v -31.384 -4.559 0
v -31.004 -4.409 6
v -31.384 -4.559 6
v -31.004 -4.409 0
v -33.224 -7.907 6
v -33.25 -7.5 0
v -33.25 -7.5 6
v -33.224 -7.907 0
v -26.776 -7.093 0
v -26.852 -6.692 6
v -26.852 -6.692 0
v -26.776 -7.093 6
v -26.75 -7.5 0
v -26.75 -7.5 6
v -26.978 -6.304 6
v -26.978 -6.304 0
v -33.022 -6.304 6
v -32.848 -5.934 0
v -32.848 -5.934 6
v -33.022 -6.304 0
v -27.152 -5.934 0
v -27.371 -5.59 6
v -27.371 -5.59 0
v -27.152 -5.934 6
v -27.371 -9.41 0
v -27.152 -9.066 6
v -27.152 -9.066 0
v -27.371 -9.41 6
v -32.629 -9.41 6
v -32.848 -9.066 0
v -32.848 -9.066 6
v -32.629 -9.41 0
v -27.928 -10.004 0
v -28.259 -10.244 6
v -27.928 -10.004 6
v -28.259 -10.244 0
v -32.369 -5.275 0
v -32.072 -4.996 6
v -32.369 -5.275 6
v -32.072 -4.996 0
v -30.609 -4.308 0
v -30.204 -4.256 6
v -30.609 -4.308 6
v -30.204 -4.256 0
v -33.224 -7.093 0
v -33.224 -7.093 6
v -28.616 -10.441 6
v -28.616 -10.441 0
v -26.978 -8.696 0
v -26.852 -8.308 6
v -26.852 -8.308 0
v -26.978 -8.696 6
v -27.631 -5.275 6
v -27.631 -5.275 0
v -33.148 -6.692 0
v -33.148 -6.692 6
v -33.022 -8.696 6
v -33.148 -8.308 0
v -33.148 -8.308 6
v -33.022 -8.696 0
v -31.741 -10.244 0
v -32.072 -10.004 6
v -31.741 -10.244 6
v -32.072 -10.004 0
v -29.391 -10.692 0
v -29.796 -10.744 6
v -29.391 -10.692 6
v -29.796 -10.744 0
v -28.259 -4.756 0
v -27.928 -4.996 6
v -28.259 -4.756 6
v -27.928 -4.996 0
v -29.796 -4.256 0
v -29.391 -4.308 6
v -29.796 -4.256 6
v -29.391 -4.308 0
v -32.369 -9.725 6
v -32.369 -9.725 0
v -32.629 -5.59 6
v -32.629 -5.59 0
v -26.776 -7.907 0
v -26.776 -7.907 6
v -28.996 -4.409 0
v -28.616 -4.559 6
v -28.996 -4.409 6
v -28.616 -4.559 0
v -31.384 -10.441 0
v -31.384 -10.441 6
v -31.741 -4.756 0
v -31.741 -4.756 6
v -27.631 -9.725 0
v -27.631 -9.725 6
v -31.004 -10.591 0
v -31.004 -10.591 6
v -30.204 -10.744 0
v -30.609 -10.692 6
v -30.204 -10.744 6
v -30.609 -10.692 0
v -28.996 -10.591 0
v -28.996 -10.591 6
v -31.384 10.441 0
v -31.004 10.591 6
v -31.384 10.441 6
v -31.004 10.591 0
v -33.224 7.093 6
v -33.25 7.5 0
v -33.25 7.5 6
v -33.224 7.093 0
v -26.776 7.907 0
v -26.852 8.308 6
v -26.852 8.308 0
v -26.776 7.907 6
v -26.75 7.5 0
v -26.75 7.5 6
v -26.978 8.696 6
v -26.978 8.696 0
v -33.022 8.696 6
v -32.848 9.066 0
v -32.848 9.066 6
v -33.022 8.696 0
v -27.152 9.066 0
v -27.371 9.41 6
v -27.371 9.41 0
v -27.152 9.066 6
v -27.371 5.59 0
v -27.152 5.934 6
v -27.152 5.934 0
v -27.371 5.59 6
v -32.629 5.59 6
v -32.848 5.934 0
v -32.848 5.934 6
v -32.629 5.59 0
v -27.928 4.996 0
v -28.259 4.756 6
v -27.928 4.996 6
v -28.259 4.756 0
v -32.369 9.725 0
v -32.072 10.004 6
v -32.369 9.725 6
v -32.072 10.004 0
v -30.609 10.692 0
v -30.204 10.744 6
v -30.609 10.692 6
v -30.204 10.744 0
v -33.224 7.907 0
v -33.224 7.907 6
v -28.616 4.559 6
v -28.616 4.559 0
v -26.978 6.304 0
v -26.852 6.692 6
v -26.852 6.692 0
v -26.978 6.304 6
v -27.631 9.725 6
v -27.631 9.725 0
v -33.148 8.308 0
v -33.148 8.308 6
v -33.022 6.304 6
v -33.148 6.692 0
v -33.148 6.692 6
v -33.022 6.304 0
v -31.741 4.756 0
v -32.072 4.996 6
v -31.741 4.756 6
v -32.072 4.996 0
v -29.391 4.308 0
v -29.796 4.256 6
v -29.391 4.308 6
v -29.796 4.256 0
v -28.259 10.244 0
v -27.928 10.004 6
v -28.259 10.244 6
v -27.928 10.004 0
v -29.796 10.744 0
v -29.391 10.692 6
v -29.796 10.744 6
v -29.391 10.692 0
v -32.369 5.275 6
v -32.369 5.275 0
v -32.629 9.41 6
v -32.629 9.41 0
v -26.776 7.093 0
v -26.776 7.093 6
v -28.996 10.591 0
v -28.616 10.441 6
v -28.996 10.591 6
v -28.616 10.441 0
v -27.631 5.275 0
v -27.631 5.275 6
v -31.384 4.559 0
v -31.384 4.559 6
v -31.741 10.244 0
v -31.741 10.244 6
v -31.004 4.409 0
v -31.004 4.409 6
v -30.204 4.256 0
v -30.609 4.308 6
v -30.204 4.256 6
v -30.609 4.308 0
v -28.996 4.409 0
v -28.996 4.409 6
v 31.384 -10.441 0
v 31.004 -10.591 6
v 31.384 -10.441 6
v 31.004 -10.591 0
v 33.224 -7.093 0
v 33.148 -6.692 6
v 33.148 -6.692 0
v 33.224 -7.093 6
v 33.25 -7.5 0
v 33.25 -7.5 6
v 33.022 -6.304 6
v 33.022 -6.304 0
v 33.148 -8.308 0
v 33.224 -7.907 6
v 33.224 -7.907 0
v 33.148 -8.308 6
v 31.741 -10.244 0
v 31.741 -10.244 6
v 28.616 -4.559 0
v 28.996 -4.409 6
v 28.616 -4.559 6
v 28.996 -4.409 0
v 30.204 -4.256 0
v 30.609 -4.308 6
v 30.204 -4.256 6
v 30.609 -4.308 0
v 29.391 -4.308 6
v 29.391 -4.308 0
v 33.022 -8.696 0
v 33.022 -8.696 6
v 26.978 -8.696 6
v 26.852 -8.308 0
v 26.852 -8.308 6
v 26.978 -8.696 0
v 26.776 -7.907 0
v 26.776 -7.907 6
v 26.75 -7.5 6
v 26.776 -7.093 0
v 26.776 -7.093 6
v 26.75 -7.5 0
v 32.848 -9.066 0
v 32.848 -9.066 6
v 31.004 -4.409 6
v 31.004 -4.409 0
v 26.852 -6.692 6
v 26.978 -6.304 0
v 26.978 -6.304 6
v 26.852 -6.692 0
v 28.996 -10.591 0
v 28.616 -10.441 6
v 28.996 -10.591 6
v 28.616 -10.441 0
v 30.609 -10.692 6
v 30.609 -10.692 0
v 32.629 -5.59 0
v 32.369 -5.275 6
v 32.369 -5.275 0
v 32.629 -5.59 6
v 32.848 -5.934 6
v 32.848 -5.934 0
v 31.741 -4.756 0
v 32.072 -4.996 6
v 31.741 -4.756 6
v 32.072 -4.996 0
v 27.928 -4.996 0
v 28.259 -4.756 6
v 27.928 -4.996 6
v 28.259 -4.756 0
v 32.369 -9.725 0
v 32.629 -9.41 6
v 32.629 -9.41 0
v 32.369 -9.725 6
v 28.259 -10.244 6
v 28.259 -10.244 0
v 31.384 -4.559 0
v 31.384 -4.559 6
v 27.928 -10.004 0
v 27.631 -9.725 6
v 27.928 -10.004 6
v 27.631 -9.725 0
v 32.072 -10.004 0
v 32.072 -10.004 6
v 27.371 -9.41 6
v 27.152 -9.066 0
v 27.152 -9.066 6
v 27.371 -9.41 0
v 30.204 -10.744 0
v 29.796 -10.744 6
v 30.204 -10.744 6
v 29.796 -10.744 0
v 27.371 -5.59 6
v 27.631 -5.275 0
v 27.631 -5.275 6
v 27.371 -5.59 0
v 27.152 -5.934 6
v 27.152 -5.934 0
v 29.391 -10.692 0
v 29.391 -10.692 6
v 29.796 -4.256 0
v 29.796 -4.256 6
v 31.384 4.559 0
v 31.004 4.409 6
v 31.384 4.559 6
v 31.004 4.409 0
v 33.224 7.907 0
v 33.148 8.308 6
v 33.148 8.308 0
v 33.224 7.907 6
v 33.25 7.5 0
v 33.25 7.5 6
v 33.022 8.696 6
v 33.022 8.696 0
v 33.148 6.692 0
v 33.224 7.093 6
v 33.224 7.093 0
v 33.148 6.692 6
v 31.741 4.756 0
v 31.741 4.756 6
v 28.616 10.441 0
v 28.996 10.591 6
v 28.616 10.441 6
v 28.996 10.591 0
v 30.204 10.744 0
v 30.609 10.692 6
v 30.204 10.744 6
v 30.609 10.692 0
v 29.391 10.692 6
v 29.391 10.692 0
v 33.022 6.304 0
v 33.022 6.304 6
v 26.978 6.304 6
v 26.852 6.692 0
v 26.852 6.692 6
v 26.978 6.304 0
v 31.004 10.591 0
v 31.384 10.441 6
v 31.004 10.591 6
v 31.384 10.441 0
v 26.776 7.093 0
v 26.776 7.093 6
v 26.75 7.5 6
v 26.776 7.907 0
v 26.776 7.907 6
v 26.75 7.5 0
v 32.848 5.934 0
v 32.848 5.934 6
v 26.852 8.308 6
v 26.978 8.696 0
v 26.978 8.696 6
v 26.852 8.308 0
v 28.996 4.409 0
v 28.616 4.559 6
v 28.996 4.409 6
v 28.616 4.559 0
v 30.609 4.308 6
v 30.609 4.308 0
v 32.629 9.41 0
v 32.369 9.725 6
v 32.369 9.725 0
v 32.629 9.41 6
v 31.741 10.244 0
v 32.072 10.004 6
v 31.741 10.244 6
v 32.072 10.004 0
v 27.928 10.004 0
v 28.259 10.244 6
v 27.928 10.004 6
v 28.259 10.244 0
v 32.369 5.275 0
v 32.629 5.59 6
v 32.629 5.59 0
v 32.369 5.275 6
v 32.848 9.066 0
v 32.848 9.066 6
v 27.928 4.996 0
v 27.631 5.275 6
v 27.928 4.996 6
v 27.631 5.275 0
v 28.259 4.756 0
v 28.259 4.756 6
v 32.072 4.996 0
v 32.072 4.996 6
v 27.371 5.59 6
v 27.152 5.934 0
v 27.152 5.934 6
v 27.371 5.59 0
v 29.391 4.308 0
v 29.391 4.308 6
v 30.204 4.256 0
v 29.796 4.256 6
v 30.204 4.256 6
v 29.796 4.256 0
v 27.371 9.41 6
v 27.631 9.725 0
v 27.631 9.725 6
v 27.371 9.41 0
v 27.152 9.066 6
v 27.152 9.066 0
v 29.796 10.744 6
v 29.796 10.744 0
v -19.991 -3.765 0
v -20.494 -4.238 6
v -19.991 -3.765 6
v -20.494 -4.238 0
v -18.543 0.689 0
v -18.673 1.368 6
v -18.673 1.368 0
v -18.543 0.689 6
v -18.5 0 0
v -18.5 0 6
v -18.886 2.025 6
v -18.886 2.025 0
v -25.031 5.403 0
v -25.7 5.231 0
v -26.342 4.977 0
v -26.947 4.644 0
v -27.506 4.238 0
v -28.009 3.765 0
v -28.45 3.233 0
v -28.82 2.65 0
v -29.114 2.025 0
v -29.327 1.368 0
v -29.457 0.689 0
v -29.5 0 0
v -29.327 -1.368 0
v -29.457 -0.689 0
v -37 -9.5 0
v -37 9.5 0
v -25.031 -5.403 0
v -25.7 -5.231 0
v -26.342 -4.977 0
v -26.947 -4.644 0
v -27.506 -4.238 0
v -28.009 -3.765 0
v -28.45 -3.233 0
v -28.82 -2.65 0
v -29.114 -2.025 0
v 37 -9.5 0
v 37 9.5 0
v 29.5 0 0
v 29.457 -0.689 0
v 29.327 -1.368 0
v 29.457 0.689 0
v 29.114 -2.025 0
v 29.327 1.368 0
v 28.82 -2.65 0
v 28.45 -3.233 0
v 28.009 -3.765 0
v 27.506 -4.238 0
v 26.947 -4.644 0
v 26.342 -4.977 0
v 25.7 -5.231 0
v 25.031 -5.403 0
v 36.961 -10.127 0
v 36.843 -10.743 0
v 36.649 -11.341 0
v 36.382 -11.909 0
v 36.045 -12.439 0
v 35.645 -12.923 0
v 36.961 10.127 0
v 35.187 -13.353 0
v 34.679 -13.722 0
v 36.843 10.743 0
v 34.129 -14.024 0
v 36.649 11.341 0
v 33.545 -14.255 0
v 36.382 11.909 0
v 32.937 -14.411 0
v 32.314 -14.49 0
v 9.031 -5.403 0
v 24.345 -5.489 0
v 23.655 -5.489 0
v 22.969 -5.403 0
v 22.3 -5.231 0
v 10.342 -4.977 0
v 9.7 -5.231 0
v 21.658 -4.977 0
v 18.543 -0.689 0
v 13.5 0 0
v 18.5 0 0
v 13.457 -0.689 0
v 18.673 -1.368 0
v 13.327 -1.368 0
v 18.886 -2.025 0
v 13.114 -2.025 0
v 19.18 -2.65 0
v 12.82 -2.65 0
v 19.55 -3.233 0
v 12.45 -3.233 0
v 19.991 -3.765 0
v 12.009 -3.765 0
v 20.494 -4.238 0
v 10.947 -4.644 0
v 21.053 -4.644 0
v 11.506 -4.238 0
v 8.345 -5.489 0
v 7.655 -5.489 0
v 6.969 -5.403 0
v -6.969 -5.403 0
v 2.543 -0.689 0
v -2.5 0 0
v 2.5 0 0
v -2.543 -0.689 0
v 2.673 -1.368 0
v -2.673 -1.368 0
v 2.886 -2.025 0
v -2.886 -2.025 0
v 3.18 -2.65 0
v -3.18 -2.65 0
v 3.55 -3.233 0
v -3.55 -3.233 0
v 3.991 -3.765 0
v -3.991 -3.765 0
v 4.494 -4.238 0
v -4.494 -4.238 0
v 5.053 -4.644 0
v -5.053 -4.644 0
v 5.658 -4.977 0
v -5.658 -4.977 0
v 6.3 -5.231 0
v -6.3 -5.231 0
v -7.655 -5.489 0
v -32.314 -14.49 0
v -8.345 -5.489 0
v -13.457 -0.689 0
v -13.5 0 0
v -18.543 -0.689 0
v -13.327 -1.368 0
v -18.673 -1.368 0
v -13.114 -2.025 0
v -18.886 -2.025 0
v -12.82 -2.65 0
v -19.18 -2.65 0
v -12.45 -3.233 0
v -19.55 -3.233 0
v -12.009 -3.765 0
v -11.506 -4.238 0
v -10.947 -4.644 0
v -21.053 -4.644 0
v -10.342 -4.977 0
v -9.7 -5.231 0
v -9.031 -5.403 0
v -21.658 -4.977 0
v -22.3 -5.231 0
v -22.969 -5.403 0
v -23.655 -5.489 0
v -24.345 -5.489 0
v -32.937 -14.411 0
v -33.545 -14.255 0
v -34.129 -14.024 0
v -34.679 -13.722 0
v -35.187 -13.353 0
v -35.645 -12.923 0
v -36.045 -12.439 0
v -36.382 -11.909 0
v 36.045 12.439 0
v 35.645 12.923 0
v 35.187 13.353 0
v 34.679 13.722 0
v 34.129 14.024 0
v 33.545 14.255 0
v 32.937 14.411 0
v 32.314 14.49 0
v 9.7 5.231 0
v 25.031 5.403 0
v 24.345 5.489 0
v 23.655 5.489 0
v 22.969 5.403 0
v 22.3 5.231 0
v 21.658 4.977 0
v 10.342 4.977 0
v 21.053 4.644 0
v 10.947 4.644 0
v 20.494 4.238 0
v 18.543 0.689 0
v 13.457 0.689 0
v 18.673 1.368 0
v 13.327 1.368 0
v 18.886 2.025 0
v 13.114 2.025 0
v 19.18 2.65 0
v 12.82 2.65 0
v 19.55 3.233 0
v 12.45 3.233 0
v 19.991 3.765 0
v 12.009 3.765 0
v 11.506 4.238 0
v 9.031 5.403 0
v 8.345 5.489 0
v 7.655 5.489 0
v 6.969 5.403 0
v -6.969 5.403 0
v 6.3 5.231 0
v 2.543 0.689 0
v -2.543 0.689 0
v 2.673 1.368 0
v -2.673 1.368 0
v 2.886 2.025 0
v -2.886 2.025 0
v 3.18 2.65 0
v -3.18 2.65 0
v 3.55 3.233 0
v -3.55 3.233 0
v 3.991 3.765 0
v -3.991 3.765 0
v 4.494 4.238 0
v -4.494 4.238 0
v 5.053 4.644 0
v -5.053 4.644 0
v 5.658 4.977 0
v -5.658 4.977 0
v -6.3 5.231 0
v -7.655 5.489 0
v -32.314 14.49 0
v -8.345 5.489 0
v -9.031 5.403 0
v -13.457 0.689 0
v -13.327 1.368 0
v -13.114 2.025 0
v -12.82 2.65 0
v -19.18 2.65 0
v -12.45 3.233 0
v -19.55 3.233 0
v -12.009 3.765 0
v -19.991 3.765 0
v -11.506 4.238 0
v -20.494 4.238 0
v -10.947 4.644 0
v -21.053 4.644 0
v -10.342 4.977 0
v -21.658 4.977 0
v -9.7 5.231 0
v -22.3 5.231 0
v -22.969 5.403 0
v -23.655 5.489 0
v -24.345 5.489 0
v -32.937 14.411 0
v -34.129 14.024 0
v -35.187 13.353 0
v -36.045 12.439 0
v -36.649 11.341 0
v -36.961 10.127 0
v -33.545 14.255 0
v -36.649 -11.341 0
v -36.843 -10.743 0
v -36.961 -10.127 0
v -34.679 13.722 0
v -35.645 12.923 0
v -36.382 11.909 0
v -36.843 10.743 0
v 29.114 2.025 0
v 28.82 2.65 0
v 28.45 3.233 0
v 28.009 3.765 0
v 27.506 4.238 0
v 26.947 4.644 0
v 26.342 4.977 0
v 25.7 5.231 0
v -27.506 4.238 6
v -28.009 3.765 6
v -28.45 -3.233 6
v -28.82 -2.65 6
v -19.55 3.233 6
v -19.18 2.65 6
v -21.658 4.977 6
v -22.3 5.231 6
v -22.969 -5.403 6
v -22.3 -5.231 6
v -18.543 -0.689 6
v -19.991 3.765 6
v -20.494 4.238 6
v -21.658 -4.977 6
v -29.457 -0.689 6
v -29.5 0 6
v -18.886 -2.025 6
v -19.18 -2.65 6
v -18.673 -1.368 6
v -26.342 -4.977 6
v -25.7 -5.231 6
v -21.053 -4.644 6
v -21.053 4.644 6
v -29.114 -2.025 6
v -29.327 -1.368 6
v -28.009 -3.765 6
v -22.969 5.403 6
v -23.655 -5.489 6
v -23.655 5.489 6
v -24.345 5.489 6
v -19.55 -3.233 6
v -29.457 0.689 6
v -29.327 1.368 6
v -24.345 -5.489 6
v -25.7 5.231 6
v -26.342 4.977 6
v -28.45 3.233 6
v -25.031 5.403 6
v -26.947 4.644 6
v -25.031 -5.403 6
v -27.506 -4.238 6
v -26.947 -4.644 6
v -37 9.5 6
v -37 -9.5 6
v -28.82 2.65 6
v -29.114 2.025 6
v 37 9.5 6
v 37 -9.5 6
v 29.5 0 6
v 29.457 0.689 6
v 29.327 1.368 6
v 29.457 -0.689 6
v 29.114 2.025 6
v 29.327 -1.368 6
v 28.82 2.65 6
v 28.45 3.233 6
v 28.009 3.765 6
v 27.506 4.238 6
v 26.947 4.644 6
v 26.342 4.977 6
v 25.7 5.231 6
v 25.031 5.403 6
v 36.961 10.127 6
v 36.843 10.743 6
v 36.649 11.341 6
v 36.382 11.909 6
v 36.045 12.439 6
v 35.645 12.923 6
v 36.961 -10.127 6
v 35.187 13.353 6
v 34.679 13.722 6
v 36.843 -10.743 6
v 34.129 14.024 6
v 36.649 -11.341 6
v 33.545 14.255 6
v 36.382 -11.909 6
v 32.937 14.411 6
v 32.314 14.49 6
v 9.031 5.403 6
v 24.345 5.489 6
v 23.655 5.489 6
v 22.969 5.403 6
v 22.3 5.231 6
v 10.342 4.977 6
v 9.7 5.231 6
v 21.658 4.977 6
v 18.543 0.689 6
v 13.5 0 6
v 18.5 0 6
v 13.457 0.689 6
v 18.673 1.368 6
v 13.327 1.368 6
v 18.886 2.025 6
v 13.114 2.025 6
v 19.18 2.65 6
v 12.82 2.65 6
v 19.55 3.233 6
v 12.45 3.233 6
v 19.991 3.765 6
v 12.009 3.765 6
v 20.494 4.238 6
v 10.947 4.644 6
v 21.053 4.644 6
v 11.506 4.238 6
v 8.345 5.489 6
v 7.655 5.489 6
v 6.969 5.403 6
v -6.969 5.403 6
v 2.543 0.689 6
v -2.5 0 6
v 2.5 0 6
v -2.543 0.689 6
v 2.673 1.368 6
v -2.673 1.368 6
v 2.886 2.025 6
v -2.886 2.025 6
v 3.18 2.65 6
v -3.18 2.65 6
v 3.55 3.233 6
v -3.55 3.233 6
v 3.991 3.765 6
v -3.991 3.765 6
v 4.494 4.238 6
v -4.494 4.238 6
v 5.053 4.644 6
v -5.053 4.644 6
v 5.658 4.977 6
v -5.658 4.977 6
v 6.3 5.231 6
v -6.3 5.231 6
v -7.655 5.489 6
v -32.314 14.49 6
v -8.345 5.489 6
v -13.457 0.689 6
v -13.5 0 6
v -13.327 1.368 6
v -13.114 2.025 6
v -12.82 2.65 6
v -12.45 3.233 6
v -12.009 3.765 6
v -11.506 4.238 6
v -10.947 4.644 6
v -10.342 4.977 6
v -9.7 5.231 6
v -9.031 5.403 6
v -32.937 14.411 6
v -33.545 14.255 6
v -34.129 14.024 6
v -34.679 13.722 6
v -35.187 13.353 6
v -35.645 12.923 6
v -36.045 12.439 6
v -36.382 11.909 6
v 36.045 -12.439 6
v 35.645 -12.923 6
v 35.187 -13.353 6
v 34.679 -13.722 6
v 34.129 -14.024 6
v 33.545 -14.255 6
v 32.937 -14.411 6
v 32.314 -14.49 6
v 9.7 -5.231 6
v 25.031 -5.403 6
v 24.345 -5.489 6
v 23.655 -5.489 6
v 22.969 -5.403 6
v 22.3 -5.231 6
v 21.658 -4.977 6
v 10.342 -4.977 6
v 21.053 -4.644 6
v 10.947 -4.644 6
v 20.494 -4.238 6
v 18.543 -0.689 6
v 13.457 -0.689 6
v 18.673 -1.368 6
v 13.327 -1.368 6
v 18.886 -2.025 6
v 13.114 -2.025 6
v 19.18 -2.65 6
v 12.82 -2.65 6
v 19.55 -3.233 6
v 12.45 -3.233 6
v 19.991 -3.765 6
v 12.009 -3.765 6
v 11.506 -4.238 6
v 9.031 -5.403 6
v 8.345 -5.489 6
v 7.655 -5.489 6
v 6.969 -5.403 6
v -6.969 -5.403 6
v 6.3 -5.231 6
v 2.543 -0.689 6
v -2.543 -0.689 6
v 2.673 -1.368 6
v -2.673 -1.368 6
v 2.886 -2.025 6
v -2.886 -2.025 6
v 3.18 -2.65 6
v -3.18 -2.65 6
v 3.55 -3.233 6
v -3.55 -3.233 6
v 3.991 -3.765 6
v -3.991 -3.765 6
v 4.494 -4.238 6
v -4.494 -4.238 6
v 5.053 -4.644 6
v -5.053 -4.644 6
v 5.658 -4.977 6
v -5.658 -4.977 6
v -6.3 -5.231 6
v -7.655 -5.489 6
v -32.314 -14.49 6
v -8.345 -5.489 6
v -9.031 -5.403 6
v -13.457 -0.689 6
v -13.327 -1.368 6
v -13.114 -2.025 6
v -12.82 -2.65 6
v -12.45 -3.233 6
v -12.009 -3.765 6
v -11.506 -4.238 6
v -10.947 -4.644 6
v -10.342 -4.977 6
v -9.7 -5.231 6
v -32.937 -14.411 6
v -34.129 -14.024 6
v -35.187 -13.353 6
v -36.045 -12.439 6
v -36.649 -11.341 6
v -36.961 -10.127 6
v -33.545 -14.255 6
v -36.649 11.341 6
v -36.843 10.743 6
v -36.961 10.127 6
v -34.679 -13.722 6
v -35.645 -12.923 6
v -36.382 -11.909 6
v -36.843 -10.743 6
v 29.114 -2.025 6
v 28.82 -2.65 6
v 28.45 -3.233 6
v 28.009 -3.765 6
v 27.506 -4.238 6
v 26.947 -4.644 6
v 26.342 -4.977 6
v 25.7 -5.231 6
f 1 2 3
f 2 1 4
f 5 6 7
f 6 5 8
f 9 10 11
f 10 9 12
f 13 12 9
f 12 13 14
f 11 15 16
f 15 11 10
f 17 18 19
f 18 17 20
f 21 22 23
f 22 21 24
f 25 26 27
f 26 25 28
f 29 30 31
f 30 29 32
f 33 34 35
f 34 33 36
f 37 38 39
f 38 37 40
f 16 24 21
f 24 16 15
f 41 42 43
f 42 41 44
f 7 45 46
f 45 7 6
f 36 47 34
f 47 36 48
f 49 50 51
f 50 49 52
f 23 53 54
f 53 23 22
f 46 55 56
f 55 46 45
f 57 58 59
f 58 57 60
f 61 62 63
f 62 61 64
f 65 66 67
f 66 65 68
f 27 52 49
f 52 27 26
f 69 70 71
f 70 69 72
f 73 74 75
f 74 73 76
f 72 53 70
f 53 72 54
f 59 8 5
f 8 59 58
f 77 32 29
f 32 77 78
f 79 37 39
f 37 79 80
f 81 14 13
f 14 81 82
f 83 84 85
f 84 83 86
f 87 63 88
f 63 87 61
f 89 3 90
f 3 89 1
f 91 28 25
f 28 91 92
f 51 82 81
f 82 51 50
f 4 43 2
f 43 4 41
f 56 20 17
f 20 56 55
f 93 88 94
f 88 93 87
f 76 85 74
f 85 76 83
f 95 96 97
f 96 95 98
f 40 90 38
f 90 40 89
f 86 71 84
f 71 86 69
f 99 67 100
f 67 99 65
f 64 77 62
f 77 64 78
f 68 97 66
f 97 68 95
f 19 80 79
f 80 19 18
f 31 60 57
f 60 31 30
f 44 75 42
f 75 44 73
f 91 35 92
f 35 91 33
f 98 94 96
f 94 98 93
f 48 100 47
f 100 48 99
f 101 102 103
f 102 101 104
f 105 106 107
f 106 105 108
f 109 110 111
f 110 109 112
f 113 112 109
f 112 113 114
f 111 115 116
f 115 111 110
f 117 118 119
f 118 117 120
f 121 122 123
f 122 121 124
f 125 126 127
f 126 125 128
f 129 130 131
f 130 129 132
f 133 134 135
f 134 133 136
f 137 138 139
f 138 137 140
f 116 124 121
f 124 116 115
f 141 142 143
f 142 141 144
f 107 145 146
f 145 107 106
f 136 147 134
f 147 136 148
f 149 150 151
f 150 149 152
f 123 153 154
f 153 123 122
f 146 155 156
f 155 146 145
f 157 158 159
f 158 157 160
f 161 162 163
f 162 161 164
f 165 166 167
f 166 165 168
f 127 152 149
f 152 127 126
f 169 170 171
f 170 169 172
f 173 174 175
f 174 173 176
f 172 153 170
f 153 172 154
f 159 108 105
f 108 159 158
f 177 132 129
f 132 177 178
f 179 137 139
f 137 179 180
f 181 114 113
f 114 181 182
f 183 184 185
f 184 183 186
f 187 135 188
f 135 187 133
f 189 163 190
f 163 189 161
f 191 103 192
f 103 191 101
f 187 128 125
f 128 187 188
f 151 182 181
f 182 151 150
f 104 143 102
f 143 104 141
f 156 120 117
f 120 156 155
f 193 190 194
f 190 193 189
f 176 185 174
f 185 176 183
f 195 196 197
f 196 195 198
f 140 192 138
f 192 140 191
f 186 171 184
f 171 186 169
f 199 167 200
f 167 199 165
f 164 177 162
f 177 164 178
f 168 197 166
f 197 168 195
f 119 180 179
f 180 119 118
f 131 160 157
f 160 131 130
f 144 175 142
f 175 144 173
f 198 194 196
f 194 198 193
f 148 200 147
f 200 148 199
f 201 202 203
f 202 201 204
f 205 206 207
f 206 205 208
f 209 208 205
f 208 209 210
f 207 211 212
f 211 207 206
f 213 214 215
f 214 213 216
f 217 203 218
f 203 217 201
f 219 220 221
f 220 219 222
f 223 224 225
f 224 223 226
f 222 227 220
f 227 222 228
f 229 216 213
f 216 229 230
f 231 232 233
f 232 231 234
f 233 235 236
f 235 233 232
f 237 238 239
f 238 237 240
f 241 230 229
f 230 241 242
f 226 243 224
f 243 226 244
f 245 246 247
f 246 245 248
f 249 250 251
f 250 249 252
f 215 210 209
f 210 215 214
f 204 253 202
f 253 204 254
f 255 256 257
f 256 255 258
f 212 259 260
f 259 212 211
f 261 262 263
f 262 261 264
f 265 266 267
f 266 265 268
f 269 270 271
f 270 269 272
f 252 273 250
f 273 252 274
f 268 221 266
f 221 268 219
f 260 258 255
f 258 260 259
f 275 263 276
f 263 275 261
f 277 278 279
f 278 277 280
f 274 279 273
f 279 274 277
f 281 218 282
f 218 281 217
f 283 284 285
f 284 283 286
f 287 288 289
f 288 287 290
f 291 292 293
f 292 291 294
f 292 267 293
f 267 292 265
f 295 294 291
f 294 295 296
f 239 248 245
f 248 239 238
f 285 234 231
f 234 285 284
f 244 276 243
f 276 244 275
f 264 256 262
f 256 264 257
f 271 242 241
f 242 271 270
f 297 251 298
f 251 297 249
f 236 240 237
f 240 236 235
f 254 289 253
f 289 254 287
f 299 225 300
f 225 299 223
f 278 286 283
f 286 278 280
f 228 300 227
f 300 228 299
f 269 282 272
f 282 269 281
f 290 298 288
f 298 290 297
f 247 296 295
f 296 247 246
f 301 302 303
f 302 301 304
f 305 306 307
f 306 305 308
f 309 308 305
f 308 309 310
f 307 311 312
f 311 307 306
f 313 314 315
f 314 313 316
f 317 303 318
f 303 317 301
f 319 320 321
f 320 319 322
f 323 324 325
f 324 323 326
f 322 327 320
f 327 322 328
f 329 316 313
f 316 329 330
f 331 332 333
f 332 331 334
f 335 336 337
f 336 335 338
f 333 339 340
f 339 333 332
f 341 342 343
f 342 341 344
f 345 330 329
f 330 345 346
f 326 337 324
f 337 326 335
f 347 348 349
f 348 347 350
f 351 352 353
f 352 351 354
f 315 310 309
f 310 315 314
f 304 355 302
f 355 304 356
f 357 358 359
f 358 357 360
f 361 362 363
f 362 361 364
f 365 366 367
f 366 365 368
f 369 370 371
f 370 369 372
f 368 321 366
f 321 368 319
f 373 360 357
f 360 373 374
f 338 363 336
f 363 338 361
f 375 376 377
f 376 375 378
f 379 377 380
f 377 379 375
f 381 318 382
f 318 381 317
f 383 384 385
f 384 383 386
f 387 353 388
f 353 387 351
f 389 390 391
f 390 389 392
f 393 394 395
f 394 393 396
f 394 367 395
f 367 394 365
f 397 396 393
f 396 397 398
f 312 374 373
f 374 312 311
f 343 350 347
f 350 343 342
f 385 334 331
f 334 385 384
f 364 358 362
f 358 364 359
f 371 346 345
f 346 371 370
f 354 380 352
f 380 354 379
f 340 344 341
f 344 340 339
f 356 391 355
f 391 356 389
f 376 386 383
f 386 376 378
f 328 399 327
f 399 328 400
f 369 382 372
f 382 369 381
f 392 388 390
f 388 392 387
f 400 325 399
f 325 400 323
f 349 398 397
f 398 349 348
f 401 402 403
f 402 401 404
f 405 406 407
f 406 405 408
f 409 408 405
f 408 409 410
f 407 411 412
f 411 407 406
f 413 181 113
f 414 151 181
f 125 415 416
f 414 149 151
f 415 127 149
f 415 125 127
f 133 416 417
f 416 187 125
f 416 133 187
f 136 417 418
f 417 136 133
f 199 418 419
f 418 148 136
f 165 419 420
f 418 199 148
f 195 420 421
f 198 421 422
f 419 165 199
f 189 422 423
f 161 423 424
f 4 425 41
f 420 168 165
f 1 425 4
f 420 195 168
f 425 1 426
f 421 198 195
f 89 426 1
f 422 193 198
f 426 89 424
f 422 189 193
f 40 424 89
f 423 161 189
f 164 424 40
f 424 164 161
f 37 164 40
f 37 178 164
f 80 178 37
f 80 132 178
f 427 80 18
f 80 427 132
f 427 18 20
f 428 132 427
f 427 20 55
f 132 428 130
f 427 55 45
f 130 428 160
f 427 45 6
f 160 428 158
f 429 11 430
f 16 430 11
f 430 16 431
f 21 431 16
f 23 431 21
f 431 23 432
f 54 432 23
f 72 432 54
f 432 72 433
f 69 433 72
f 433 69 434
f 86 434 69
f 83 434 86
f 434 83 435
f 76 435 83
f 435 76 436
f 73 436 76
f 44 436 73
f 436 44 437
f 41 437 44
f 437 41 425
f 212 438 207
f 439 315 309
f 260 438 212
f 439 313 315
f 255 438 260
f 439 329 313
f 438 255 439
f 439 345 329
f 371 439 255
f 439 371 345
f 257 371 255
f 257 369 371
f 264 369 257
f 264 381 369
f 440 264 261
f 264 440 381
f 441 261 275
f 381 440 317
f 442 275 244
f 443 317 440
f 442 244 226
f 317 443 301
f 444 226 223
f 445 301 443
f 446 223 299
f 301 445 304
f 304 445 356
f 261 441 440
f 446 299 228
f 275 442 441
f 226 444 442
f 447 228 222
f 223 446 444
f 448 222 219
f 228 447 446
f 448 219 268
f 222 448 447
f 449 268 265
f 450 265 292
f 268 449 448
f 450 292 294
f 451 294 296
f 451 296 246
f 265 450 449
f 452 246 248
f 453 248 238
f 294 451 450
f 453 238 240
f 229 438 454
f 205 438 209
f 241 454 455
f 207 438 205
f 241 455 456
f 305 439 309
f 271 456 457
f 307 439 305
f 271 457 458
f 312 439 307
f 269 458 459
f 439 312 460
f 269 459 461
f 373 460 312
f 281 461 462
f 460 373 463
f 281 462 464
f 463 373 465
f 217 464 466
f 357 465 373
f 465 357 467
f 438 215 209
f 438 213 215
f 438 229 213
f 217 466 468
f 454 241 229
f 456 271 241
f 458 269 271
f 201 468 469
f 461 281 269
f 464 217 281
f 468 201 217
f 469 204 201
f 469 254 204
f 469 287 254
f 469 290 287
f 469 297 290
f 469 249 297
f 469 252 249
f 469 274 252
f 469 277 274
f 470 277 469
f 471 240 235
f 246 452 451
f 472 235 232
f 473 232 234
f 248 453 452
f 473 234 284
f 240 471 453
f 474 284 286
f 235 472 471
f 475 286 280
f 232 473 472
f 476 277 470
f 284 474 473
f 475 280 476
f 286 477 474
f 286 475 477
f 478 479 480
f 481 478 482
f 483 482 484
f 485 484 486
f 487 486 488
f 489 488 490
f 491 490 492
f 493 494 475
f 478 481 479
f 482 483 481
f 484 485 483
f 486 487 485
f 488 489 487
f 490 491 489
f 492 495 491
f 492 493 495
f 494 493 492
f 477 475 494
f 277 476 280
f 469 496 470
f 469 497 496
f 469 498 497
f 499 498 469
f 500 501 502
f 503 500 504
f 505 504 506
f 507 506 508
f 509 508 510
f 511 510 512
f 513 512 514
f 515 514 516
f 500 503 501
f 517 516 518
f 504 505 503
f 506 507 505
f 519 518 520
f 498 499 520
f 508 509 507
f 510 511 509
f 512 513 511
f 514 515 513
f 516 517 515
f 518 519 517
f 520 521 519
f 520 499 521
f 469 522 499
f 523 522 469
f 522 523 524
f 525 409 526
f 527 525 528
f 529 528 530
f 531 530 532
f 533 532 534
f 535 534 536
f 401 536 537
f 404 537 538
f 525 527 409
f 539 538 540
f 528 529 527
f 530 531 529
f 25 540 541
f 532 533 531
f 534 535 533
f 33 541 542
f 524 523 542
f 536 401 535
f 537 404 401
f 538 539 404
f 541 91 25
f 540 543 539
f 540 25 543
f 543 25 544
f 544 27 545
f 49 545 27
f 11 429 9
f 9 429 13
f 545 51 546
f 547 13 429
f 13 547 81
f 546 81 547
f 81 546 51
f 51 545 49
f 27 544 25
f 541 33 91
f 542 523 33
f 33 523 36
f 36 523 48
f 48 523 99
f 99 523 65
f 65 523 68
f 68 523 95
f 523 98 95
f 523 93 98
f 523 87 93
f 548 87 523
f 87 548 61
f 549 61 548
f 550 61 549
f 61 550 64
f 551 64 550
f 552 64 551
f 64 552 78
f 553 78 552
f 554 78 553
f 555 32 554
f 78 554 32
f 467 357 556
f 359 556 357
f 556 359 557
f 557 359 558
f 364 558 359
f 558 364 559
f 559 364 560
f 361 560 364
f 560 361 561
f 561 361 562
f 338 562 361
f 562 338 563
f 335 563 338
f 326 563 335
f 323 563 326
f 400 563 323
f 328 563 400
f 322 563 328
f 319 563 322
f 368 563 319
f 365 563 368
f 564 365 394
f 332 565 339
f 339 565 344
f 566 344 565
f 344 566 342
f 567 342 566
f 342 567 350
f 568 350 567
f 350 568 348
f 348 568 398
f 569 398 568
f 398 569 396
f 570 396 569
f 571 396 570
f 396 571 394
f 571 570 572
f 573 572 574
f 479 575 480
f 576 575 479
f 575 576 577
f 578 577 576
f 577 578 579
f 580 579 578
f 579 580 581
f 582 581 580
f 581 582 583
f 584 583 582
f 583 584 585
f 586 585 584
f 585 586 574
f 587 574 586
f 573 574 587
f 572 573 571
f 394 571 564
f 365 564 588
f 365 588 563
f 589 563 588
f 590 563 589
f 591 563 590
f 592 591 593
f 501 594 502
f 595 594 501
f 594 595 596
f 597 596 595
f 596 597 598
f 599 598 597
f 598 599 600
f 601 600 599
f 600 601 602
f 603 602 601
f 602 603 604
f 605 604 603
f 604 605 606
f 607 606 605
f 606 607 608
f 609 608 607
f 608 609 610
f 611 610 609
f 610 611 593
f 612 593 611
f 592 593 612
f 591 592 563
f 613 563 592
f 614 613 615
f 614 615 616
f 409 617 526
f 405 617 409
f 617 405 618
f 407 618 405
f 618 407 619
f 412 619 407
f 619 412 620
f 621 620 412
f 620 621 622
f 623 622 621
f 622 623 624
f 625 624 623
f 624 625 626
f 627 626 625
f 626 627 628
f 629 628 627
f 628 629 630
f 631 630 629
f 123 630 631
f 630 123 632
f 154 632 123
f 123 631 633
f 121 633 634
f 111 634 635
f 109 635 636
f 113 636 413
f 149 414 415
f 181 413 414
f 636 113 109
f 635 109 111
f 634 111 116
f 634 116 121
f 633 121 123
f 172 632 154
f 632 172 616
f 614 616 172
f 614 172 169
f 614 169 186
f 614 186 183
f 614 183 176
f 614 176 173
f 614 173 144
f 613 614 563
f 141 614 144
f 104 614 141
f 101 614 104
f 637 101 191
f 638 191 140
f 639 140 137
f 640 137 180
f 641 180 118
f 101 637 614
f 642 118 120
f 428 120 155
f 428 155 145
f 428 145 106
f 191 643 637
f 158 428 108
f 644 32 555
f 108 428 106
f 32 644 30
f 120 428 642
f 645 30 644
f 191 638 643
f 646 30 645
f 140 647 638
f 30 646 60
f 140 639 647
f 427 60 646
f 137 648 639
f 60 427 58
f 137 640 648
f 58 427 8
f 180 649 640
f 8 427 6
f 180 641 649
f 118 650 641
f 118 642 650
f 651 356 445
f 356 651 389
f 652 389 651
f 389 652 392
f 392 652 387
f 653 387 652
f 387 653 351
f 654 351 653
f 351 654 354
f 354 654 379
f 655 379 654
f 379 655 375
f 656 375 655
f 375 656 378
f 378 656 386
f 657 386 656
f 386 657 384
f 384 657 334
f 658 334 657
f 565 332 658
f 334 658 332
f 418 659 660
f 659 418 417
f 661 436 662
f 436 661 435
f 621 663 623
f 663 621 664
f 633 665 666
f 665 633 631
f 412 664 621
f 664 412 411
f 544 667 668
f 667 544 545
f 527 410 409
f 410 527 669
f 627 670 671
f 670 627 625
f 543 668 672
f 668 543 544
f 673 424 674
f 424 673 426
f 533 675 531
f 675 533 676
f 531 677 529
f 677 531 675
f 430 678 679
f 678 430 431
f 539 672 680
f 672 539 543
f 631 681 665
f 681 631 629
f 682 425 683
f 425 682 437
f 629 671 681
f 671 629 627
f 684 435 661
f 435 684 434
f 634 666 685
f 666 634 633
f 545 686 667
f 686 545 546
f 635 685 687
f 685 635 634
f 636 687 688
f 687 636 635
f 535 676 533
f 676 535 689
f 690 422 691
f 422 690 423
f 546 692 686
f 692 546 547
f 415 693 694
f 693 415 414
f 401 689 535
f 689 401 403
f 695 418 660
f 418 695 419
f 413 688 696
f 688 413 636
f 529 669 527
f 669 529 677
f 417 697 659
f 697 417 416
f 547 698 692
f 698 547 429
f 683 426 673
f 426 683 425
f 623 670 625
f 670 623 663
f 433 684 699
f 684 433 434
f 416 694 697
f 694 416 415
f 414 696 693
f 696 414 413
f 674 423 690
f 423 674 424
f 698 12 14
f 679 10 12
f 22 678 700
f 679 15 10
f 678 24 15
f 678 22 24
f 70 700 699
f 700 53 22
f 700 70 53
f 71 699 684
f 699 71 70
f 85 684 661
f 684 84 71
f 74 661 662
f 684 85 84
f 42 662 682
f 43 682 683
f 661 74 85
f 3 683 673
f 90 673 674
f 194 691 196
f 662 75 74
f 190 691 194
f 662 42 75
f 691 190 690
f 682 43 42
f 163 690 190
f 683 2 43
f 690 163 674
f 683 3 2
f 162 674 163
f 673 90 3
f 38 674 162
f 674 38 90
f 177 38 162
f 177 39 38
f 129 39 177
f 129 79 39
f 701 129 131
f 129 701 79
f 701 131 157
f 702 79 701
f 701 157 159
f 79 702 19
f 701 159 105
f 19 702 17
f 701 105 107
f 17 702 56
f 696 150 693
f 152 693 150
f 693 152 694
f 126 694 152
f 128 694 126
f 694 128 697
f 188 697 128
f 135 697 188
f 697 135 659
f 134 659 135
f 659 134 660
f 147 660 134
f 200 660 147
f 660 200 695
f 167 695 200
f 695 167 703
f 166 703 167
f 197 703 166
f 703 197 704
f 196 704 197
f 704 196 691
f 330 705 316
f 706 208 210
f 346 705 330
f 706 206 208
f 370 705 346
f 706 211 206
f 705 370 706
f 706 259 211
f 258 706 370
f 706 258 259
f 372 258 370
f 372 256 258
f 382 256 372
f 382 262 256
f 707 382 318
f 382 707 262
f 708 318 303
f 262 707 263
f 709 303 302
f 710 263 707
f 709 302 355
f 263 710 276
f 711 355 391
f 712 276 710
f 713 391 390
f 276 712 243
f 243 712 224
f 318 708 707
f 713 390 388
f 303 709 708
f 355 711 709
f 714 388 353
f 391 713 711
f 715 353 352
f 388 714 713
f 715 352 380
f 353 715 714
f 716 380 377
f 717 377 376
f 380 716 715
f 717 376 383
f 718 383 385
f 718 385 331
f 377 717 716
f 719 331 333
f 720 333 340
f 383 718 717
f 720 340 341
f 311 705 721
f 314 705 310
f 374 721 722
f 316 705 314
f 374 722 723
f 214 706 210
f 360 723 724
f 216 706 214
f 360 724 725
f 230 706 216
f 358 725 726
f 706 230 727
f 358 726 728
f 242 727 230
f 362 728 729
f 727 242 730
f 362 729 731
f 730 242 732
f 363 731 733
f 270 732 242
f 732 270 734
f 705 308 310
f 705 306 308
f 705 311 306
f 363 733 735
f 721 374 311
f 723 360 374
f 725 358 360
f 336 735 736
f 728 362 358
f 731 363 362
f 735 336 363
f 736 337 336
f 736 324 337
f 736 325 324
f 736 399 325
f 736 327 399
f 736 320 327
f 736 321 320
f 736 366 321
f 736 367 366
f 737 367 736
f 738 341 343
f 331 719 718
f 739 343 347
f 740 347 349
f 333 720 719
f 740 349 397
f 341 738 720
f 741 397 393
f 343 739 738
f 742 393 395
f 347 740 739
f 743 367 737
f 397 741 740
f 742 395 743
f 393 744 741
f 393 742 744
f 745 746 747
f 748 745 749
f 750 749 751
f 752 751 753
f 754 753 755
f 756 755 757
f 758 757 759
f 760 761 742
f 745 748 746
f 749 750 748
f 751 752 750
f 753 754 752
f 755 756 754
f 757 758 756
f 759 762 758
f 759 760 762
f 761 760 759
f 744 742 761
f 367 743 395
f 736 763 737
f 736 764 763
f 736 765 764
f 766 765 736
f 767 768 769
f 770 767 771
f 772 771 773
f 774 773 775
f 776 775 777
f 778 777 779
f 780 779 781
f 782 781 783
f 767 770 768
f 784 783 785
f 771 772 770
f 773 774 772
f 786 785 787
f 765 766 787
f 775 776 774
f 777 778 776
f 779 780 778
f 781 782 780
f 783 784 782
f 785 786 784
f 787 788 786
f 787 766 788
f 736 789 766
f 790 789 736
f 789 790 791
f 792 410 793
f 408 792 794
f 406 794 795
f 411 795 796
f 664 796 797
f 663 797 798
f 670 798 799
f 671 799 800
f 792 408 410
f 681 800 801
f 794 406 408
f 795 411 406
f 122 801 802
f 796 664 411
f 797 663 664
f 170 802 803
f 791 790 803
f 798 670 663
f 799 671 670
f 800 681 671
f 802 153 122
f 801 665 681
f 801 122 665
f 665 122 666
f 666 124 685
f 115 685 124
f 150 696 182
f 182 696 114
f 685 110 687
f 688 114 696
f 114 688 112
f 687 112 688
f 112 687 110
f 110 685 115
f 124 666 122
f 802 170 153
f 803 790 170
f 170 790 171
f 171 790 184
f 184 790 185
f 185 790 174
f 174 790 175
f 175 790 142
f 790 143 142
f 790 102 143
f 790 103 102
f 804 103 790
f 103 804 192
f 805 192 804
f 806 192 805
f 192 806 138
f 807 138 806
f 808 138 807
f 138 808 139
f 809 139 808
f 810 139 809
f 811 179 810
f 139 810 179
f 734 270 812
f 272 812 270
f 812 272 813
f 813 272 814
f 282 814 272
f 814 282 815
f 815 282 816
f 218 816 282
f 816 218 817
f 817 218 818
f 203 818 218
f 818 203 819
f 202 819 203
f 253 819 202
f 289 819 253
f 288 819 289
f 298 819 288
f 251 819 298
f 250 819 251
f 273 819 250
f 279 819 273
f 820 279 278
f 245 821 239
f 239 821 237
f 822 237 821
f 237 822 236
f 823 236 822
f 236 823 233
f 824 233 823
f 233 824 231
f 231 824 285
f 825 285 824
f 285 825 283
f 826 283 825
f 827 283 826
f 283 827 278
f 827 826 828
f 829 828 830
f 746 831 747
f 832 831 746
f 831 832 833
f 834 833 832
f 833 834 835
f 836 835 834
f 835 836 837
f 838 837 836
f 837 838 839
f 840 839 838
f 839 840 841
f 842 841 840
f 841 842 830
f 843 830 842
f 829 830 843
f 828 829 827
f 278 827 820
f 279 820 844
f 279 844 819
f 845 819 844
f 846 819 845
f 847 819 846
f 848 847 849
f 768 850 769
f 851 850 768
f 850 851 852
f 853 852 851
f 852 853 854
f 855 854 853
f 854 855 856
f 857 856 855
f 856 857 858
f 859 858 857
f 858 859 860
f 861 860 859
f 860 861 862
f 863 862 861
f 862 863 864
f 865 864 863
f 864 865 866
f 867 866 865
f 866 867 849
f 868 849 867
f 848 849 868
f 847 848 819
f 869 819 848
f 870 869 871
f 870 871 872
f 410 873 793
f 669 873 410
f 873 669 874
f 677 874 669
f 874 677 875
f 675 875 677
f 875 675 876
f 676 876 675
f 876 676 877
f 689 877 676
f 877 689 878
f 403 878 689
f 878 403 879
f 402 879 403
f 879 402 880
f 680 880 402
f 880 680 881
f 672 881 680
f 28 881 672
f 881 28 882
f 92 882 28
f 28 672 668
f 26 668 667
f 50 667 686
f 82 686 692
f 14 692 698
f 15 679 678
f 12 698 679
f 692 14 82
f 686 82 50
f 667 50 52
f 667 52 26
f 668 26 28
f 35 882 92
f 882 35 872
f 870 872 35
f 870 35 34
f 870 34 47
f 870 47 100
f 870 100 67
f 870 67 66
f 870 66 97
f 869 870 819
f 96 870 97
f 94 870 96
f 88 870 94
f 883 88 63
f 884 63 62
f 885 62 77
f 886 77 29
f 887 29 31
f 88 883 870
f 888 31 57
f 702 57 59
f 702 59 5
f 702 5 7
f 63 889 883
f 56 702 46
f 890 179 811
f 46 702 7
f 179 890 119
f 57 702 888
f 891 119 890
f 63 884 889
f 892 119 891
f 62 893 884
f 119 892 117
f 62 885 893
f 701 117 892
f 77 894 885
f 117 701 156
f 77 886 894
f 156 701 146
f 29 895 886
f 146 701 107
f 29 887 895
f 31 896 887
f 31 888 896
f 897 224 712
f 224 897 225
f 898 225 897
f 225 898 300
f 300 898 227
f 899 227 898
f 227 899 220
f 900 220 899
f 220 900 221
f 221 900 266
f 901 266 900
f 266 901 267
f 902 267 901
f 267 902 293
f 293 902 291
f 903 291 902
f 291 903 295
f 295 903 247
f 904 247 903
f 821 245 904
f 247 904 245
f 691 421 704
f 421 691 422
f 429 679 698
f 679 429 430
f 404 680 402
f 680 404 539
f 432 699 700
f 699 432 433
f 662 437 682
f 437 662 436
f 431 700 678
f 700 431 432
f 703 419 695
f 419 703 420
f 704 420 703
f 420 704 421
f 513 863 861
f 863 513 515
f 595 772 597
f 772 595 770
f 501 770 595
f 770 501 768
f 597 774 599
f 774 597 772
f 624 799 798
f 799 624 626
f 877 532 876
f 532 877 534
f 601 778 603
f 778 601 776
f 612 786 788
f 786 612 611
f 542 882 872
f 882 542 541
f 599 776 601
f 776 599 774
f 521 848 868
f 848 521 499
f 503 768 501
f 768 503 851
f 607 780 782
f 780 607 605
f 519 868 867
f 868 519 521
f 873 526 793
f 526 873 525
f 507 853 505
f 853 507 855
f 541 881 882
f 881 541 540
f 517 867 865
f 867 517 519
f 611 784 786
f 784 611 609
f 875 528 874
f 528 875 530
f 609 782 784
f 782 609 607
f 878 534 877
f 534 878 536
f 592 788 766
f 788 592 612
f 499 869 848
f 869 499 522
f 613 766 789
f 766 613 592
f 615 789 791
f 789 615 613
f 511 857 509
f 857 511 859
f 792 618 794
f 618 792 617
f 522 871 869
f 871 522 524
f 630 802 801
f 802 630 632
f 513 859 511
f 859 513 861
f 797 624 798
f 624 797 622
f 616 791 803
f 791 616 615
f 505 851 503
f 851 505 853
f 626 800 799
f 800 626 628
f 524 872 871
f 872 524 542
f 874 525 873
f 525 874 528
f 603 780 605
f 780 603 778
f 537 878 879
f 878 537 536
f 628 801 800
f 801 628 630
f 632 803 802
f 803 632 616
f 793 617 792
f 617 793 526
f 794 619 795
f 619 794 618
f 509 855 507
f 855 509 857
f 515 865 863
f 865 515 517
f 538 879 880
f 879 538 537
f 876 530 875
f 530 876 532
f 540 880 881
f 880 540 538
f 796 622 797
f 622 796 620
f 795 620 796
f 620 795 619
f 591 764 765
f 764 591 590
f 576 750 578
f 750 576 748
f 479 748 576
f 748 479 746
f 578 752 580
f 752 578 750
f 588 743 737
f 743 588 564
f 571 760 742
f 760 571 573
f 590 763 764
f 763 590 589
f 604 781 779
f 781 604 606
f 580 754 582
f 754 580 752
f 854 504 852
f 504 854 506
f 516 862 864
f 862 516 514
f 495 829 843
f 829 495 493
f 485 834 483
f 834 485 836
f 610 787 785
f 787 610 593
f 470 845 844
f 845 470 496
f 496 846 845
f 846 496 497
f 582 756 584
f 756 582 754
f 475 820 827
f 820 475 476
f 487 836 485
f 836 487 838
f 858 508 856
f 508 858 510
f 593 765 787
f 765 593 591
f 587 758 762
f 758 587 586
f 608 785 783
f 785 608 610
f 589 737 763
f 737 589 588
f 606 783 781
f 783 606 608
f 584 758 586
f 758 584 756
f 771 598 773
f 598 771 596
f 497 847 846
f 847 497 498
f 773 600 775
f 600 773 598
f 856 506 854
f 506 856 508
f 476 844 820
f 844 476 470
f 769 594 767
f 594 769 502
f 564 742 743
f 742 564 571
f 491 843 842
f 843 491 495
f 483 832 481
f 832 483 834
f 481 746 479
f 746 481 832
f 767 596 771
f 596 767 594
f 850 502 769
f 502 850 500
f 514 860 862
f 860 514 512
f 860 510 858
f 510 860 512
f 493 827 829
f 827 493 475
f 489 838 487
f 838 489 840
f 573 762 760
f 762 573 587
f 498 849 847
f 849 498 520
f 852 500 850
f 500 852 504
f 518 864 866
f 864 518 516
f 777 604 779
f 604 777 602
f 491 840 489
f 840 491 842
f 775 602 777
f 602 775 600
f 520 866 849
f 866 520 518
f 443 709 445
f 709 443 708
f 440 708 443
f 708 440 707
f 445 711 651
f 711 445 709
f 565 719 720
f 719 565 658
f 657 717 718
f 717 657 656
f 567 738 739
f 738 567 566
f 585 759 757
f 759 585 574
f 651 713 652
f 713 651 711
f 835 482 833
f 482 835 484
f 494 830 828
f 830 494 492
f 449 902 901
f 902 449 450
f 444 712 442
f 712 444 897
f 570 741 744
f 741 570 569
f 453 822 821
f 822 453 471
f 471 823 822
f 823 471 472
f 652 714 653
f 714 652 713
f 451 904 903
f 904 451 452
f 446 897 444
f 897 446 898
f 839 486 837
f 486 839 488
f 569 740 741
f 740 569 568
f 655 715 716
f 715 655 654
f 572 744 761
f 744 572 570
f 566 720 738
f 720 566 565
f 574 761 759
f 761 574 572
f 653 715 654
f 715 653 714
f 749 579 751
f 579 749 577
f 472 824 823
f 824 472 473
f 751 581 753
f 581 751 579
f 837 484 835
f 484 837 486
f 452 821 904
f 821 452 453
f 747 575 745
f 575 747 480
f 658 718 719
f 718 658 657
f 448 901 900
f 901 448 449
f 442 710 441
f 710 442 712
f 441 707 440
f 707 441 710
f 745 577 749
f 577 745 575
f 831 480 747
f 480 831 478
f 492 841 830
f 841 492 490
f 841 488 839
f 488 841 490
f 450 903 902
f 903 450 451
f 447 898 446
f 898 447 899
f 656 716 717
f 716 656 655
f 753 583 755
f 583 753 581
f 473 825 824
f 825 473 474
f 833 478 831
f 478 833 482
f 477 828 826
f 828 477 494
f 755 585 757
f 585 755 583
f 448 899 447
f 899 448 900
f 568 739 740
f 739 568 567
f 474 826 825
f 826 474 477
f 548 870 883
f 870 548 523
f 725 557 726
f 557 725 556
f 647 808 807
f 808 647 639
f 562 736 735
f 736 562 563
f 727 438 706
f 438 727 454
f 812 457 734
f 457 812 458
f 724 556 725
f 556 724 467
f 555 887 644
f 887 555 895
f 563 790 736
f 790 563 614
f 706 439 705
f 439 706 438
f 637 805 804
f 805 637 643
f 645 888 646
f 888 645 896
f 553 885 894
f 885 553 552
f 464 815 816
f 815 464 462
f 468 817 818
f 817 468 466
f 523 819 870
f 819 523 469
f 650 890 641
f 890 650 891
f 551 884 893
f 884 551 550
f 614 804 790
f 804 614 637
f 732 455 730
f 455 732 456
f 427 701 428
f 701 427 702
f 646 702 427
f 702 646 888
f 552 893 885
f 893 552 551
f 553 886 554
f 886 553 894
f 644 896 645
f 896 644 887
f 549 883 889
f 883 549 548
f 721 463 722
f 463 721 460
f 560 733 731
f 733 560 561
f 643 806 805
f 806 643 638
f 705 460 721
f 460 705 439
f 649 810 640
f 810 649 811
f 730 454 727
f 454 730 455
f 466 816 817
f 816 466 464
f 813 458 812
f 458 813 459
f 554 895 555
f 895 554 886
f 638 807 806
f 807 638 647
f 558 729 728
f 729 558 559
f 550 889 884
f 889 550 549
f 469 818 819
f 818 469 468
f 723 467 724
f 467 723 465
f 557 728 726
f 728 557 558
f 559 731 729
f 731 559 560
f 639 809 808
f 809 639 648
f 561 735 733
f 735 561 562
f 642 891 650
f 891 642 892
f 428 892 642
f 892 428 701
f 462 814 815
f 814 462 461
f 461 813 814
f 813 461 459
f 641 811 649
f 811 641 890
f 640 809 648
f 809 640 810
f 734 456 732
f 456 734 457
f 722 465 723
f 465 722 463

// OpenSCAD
$fn = 50;

difference() {
	union() {
		hull() {
			translate(v = [-32.0, 9.5, 0]) {
				cylinder(h = 6, r = 5);
			}
			translate(v = [32.0, 9.5, 0]) {
				cylinder(h = 6, r = 5);
			}
			translate(v = [-32.0, -9.5, 0]) {
				cylinder(h = 6, r = 5);
			}
			translate(v = [32.0, -9.5, 0]) {
				cylinder(h = 6, r = 5);
			}
		}
	}
	union() {
		translate(v = [-30.0, -7.5, -100.0]) {
			cylinder(h = 200, r = 3.25);
		}
		translate(v = [-30.0, 7.5, -100.0]) {
			cylinder(h = 200, r = 3.25);
		}
		translate(v = [30.0, -7.5, -100.0]) {
			cylinder(h = 200, r = 3.25);
		}
		translate(v = [30.0, 7.5, -100.0]) {
			cylinder(h = 200, r = 3.25);
		}
		translate(v = [-30.0, -7.5, -100.0]) {
			cylinder(h = 200, r = 1.8);
		}
		translate(v = [-30.0, 7.5, -100.0]) {
			cylinder(h = 200, r = 1.8);
		}
		translate(v = [30.0, -7.5, -100.0]) {
			cylinder(h = 200, r = 1.8);
		}
		translate(v = [30.0, 7.5, -100.0]) {
			cylinder(h = 200, r = 1.8);
		}
		translate(v = [-24.0, 0, 0.0]) {
			cylinder(h = 6, r = 5.5);
		}
		translate(v = [-8.0, 0, 0.0]) {
			cylinder(h = 6, r = 5.5);
		}
		translate(v = [8.0, 0, 0.0]) {
			cylinder(h = 6, r = 5.5);
		}
		translate(v = [24.0, 0, 0.0]) {
			cylinder(h = 6, r = 5.5);
		}
	}
}
